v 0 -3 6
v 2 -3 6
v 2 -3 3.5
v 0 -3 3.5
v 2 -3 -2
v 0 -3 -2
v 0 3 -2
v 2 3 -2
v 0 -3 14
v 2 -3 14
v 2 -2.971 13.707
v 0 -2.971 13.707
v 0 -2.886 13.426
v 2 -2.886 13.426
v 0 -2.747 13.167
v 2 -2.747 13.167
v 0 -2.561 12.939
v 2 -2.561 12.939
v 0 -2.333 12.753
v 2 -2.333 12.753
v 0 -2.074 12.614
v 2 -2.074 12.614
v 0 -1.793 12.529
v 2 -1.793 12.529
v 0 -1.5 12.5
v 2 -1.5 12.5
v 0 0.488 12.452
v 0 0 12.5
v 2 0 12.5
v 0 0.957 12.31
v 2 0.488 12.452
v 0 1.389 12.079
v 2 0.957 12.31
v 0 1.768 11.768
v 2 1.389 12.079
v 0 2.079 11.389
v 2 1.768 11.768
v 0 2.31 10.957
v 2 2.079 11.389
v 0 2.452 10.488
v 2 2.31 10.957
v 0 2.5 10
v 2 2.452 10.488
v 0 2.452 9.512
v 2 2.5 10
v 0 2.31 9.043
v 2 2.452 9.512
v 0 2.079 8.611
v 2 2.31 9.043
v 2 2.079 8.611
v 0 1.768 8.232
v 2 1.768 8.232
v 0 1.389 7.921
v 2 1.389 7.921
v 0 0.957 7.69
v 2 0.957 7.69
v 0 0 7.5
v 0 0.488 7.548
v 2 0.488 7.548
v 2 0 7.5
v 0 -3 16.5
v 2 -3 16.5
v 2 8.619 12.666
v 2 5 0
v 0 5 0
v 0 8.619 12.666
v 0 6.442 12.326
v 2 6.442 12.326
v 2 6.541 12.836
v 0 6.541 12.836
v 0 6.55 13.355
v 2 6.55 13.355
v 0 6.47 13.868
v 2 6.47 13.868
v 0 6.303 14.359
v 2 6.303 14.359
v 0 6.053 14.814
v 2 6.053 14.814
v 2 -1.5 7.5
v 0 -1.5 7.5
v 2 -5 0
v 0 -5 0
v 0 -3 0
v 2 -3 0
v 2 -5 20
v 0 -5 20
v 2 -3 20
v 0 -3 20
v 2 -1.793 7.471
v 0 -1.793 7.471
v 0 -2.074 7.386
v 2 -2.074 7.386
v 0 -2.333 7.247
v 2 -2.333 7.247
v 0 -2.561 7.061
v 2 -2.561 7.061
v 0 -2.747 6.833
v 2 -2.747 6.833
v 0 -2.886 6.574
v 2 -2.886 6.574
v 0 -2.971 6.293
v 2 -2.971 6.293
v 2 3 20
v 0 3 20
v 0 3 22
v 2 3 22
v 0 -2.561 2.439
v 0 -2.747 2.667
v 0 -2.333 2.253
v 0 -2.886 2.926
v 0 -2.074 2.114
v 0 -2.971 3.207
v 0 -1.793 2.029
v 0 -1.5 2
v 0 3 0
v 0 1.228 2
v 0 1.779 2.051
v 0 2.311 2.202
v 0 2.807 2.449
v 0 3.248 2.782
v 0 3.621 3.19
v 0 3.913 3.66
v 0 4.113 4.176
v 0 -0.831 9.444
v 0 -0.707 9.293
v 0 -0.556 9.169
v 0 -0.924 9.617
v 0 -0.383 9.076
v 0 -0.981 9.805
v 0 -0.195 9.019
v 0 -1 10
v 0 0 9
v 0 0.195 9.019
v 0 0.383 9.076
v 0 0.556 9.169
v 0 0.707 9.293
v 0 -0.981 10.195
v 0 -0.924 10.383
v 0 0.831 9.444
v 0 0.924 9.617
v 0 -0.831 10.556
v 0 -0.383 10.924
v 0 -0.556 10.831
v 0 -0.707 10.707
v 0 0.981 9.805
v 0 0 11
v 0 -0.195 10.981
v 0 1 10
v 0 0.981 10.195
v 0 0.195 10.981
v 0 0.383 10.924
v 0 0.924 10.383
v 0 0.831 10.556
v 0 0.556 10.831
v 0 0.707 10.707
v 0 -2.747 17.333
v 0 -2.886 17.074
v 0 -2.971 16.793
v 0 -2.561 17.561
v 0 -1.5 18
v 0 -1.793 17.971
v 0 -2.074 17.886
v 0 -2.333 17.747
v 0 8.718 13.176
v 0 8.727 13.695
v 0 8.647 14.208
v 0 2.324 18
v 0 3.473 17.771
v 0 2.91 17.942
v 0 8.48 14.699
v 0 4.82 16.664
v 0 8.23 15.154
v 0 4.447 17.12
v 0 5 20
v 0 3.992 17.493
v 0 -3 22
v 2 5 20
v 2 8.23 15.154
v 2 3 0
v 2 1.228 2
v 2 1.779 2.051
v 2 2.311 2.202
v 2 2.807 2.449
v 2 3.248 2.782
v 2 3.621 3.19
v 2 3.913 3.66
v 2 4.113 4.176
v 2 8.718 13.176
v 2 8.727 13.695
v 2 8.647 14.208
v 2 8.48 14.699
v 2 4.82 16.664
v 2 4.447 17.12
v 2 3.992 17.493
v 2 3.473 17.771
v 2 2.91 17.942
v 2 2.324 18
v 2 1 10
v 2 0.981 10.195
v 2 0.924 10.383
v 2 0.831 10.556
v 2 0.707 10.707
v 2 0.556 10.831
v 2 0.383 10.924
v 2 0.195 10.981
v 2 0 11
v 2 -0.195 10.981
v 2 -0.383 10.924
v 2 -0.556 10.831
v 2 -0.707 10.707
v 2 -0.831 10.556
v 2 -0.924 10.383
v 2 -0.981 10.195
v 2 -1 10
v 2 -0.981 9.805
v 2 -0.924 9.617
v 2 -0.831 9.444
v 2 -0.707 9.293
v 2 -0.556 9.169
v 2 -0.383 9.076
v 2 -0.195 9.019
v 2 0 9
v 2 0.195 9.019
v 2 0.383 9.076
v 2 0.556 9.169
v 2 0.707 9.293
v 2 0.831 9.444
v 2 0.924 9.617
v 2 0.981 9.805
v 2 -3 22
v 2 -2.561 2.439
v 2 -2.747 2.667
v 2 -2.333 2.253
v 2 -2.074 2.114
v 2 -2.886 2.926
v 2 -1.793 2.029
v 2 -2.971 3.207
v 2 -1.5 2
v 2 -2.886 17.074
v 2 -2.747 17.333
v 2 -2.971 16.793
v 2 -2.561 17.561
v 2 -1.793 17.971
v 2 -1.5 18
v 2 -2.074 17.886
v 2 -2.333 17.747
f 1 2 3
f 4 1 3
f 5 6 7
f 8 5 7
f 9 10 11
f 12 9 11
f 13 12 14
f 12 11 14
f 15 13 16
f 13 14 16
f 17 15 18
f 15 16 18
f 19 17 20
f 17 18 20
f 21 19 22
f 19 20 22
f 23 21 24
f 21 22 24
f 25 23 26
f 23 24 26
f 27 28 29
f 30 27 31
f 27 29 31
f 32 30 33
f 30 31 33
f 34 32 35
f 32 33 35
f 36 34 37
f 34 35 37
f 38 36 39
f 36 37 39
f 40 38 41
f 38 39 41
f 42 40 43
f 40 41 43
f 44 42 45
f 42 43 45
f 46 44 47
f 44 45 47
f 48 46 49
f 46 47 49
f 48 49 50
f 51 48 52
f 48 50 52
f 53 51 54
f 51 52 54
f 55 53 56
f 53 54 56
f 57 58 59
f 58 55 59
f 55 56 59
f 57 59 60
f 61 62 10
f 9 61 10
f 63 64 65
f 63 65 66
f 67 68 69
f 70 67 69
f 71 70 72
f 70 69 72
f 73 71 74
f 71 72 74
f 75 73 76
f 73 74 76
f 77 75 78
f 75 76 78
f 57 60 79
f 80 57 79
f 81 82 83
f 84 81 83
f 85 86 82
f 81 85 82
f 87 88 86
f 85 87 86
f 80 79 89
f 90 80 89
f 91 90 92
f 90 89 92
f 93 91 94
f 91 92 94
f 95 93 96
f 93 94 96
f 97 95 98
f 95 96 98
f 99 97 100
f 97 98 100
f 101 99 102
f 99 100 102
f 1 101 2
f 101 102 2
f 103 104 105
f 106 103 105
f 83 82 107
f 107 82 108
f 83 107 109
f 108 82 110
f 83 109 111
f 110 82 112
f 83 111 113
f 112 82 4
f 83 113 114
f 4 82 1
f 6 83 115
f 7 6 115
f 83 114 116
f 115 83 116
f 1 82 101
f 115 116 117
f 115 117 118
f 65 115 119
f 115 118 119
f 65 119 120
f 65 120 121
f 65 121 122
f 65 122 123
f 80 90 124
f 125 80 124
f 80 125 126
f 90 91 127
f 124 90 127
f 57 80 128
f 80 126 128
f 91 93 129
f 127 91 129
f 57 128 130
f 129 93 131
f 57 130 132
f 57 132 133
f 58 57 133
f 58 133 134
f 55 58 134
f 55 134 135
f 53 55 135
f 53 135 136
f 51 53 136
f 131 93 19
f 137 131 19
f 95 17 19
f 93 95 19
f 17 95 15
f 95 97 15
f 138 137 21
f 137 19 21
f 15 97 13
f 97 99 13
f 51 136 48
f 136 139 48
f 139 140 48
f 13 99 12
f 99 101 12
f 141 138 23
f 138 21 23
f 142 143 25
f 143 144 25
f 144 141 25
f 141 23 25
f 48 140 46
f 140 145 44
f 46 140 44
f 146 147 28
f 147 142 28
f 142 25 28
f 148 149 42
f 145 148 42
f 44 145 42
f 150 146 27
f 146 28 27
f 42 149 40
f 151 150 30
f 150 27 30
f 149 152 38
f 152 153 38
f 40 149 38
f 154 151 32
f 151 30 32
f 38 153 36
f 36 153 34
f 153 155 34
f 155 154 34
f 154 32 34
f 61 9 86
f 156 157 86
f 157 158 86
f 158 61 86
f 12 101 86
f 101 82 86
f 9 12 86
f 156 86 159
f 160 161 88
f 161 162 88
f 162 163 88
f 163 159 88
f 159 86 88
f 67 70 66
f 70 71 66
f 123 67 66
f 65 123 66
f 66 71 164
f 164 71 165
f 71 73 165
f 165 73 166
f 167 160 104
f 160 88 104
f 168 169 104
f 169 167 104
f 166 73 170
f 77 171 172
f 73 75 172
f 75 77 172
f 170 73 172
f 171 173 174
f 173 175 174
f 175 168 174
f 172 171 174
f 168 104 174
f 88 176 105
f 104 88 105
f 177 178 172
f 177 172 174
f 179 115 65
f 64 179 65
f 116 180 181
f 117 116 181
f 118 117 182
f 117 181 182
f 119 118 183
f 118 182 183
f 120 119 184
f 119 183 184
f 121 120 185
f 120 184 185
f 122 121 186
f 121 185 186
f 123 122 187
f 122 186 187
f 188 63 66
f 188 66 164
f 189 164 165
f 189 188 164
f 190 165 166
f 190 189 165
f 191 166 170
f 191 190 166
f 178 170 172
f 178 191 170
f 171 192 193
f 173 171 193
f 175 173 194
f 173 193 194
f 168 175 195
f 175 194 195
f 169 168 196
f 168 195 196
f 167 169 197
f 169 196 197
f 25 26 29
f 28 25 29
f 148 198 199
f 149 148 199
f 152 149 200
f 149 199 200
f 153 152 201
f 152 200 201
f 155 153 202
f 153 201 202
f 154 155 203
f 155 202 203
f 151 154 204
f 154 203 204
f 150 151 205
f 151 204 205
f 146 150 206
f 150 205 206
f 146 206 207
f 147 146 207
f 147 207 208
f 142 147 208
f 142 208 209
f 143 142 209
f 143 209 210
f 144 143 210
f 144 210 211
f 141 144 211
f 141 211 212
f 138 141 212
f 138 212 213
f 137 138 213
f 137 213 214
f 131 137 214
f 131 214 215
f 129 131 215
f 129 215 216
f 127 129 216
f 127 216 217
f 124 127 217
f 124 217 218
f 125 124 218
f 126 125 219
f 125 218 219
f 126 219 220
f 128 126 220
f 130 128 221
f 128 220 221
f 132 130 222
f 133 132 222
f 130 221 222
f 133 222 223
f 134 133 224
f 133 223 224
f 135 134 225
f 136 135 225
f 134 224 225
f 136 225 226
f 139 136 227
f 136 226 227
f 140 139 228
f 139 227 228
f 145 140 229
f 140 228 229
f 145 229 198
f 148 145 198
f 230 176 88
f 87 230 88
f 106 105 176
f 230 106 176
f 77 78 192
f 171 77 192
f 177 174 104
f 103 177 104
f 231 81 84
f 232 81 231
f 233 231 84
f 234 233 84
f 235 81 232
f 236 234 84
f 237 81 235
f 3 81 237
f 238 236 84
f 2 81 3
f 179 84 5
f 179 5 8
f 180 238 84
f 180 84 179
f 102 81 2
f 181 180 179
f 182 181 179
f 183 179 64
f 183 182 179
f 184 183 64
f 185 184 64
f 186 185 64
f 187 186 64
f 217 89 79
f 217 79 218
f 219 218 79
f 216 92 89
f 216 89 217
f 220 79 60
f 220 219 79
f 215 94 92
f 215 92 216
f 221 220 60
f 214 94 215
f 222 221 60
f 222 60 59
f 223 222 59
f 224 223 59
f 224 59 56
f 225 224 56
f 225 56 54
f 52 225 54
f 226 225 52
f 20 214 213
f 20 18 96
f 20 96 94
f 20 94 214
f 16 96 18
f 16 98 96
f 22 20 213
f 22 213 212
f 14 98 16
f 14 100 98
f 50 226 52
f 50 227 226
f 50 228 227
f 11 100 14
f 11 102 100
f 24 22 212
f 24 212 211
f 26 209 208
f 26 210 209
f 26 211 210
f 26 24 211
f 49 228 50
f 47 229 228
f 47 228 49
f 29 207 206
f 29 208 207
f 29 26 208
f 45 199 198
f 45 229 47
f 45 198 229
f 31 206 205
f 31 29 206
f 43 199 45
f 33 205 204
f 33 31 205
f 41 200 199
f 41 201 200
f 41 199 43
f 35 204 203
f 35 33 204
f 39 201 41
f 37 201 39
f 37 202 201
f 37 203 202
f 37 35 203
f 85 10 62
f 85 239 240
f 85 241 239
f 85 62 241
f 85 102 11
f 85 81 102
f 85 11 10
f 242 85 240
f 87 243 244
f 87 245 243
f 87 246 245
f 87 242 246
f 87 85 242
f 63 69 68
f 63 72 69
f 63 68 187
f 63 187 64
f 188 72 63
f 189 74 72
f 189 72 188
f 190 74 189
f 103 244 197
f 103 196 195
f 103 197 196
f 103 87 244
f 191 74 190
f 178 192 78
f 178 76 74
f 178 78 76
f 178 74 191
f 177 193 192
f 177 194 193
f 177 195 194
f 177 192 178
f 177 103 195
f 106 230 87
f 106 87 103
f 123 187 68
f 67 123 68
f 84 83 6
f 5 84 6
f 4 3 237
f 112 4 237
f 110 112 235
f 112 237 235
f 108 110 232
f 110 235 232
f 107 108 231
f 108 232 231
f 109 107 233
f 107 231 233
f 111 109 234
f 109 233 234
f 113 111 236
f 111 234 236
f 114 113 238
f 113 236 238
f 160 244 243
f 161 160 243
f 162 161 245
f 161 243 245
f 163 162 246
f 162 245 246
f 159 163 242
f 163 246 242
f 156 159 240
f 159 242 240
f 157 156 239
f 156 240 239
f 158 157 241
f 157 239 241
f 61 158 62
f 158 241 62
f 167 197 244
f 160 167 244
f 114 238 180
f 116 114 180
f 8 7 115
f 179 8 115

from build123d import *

# Parameters (mm, degrees)
F1_DEPTH = 2
F3_DEPTH = 2
F4_R     = 1
F5_DEPTH = 2.001
F7_DEPTH = 2.001


with BuildPart() as f1:
    # F0 (on Right) → F1 (new body)
    with BuildSketch(Plane.YZ):
        Polygon((-3, 0), (-3, -2), (3, -2), (3, 0), (5, 0), (5, 20), (3, 20), (3, 22), (-3, 22), (-3, 20), (-5, 20), (-5, 0), align=None)
    extrude(amount=F1_DEPTH)

    # F2 (on face) → F3 (join, through all)
    with BuildSketch(Plane.YZ.offset(2)):
        with BuildLine():
            Line((3, 0), (5, 0))
            Line((5, 0), (8.618873, 12.666057))
            ThreePointArc((8.618873, 12.666057), (8.698405, 13.952921), (8.230453, 15.154321))
            Line((8.230453, 15.154321), (5, 20))
            Line((5, 20), (3, 20))
            Line((3, 20), (3, 0))
        make_face()
    extrude(amount=-F3_DEPTH)

    # F4 (on face) → F5 (cut, through all)
    with BuildSketch(Plane.YZ.offset(2)):
        with Locations((0, 10)):
            Circle(F4_R)
    extrude(amount=-F5_DEPTH, mode=Mode.SUBTRACT)

    # F6 (on face) → F7 (cut, through all)
    with BuildSketch(Plane.YZ.offset(2)):
        with BuildLine():
            ThreePointArc((1.228493, 2), (3.035079, 2.604954), (4.113065, 4.175837))
            Line((4.113065, 4.175837), (6.441741, 12.326204))
            ThreePointArc((6.441741, 12.326204), (6.521273, 13.613068), (6.05332, 14.814468))
            Line((6.05332, 14.814468), (4.820232, 16.664101))
            ThreePointArc((4.820232, 16.664101), (3.739655, 17.645024), (2.324081, 18))
            Line((2.324081, 18), (-1.5, 18))
            ThreePointArc((-1.5, 18), (-2.56066, 17.56066), (-3, 16.5))
            Line((-3, 16.5), (-3, 14))
            ThreePointArc((-3, 14), (-2.56066, 12.93934), (-1.5, 12.5))
            Line((-1.5, 12.5), (0, 12.5))
            ThreePointArc((0, 12.5), (2.5, 10), (0, 7.5))
            Line((0, 7.5), (-1.5, 7.5))
            ThreePointArc((-1.5, 7.5), (-2.56066, 7.06066), (-3, 6))
            Line((-3, 6), (-3, 3.5))
            ThreePointArc((-3, 3.5), (-2.56066, 2.43934), (-1.5, 2))
            Line((-1.5, 2), (1.228493, 2))
        make_face()
    extrude(amount=-F7_DEPTH, mode=Mode.SUBTRACT)


solid = f1.part
